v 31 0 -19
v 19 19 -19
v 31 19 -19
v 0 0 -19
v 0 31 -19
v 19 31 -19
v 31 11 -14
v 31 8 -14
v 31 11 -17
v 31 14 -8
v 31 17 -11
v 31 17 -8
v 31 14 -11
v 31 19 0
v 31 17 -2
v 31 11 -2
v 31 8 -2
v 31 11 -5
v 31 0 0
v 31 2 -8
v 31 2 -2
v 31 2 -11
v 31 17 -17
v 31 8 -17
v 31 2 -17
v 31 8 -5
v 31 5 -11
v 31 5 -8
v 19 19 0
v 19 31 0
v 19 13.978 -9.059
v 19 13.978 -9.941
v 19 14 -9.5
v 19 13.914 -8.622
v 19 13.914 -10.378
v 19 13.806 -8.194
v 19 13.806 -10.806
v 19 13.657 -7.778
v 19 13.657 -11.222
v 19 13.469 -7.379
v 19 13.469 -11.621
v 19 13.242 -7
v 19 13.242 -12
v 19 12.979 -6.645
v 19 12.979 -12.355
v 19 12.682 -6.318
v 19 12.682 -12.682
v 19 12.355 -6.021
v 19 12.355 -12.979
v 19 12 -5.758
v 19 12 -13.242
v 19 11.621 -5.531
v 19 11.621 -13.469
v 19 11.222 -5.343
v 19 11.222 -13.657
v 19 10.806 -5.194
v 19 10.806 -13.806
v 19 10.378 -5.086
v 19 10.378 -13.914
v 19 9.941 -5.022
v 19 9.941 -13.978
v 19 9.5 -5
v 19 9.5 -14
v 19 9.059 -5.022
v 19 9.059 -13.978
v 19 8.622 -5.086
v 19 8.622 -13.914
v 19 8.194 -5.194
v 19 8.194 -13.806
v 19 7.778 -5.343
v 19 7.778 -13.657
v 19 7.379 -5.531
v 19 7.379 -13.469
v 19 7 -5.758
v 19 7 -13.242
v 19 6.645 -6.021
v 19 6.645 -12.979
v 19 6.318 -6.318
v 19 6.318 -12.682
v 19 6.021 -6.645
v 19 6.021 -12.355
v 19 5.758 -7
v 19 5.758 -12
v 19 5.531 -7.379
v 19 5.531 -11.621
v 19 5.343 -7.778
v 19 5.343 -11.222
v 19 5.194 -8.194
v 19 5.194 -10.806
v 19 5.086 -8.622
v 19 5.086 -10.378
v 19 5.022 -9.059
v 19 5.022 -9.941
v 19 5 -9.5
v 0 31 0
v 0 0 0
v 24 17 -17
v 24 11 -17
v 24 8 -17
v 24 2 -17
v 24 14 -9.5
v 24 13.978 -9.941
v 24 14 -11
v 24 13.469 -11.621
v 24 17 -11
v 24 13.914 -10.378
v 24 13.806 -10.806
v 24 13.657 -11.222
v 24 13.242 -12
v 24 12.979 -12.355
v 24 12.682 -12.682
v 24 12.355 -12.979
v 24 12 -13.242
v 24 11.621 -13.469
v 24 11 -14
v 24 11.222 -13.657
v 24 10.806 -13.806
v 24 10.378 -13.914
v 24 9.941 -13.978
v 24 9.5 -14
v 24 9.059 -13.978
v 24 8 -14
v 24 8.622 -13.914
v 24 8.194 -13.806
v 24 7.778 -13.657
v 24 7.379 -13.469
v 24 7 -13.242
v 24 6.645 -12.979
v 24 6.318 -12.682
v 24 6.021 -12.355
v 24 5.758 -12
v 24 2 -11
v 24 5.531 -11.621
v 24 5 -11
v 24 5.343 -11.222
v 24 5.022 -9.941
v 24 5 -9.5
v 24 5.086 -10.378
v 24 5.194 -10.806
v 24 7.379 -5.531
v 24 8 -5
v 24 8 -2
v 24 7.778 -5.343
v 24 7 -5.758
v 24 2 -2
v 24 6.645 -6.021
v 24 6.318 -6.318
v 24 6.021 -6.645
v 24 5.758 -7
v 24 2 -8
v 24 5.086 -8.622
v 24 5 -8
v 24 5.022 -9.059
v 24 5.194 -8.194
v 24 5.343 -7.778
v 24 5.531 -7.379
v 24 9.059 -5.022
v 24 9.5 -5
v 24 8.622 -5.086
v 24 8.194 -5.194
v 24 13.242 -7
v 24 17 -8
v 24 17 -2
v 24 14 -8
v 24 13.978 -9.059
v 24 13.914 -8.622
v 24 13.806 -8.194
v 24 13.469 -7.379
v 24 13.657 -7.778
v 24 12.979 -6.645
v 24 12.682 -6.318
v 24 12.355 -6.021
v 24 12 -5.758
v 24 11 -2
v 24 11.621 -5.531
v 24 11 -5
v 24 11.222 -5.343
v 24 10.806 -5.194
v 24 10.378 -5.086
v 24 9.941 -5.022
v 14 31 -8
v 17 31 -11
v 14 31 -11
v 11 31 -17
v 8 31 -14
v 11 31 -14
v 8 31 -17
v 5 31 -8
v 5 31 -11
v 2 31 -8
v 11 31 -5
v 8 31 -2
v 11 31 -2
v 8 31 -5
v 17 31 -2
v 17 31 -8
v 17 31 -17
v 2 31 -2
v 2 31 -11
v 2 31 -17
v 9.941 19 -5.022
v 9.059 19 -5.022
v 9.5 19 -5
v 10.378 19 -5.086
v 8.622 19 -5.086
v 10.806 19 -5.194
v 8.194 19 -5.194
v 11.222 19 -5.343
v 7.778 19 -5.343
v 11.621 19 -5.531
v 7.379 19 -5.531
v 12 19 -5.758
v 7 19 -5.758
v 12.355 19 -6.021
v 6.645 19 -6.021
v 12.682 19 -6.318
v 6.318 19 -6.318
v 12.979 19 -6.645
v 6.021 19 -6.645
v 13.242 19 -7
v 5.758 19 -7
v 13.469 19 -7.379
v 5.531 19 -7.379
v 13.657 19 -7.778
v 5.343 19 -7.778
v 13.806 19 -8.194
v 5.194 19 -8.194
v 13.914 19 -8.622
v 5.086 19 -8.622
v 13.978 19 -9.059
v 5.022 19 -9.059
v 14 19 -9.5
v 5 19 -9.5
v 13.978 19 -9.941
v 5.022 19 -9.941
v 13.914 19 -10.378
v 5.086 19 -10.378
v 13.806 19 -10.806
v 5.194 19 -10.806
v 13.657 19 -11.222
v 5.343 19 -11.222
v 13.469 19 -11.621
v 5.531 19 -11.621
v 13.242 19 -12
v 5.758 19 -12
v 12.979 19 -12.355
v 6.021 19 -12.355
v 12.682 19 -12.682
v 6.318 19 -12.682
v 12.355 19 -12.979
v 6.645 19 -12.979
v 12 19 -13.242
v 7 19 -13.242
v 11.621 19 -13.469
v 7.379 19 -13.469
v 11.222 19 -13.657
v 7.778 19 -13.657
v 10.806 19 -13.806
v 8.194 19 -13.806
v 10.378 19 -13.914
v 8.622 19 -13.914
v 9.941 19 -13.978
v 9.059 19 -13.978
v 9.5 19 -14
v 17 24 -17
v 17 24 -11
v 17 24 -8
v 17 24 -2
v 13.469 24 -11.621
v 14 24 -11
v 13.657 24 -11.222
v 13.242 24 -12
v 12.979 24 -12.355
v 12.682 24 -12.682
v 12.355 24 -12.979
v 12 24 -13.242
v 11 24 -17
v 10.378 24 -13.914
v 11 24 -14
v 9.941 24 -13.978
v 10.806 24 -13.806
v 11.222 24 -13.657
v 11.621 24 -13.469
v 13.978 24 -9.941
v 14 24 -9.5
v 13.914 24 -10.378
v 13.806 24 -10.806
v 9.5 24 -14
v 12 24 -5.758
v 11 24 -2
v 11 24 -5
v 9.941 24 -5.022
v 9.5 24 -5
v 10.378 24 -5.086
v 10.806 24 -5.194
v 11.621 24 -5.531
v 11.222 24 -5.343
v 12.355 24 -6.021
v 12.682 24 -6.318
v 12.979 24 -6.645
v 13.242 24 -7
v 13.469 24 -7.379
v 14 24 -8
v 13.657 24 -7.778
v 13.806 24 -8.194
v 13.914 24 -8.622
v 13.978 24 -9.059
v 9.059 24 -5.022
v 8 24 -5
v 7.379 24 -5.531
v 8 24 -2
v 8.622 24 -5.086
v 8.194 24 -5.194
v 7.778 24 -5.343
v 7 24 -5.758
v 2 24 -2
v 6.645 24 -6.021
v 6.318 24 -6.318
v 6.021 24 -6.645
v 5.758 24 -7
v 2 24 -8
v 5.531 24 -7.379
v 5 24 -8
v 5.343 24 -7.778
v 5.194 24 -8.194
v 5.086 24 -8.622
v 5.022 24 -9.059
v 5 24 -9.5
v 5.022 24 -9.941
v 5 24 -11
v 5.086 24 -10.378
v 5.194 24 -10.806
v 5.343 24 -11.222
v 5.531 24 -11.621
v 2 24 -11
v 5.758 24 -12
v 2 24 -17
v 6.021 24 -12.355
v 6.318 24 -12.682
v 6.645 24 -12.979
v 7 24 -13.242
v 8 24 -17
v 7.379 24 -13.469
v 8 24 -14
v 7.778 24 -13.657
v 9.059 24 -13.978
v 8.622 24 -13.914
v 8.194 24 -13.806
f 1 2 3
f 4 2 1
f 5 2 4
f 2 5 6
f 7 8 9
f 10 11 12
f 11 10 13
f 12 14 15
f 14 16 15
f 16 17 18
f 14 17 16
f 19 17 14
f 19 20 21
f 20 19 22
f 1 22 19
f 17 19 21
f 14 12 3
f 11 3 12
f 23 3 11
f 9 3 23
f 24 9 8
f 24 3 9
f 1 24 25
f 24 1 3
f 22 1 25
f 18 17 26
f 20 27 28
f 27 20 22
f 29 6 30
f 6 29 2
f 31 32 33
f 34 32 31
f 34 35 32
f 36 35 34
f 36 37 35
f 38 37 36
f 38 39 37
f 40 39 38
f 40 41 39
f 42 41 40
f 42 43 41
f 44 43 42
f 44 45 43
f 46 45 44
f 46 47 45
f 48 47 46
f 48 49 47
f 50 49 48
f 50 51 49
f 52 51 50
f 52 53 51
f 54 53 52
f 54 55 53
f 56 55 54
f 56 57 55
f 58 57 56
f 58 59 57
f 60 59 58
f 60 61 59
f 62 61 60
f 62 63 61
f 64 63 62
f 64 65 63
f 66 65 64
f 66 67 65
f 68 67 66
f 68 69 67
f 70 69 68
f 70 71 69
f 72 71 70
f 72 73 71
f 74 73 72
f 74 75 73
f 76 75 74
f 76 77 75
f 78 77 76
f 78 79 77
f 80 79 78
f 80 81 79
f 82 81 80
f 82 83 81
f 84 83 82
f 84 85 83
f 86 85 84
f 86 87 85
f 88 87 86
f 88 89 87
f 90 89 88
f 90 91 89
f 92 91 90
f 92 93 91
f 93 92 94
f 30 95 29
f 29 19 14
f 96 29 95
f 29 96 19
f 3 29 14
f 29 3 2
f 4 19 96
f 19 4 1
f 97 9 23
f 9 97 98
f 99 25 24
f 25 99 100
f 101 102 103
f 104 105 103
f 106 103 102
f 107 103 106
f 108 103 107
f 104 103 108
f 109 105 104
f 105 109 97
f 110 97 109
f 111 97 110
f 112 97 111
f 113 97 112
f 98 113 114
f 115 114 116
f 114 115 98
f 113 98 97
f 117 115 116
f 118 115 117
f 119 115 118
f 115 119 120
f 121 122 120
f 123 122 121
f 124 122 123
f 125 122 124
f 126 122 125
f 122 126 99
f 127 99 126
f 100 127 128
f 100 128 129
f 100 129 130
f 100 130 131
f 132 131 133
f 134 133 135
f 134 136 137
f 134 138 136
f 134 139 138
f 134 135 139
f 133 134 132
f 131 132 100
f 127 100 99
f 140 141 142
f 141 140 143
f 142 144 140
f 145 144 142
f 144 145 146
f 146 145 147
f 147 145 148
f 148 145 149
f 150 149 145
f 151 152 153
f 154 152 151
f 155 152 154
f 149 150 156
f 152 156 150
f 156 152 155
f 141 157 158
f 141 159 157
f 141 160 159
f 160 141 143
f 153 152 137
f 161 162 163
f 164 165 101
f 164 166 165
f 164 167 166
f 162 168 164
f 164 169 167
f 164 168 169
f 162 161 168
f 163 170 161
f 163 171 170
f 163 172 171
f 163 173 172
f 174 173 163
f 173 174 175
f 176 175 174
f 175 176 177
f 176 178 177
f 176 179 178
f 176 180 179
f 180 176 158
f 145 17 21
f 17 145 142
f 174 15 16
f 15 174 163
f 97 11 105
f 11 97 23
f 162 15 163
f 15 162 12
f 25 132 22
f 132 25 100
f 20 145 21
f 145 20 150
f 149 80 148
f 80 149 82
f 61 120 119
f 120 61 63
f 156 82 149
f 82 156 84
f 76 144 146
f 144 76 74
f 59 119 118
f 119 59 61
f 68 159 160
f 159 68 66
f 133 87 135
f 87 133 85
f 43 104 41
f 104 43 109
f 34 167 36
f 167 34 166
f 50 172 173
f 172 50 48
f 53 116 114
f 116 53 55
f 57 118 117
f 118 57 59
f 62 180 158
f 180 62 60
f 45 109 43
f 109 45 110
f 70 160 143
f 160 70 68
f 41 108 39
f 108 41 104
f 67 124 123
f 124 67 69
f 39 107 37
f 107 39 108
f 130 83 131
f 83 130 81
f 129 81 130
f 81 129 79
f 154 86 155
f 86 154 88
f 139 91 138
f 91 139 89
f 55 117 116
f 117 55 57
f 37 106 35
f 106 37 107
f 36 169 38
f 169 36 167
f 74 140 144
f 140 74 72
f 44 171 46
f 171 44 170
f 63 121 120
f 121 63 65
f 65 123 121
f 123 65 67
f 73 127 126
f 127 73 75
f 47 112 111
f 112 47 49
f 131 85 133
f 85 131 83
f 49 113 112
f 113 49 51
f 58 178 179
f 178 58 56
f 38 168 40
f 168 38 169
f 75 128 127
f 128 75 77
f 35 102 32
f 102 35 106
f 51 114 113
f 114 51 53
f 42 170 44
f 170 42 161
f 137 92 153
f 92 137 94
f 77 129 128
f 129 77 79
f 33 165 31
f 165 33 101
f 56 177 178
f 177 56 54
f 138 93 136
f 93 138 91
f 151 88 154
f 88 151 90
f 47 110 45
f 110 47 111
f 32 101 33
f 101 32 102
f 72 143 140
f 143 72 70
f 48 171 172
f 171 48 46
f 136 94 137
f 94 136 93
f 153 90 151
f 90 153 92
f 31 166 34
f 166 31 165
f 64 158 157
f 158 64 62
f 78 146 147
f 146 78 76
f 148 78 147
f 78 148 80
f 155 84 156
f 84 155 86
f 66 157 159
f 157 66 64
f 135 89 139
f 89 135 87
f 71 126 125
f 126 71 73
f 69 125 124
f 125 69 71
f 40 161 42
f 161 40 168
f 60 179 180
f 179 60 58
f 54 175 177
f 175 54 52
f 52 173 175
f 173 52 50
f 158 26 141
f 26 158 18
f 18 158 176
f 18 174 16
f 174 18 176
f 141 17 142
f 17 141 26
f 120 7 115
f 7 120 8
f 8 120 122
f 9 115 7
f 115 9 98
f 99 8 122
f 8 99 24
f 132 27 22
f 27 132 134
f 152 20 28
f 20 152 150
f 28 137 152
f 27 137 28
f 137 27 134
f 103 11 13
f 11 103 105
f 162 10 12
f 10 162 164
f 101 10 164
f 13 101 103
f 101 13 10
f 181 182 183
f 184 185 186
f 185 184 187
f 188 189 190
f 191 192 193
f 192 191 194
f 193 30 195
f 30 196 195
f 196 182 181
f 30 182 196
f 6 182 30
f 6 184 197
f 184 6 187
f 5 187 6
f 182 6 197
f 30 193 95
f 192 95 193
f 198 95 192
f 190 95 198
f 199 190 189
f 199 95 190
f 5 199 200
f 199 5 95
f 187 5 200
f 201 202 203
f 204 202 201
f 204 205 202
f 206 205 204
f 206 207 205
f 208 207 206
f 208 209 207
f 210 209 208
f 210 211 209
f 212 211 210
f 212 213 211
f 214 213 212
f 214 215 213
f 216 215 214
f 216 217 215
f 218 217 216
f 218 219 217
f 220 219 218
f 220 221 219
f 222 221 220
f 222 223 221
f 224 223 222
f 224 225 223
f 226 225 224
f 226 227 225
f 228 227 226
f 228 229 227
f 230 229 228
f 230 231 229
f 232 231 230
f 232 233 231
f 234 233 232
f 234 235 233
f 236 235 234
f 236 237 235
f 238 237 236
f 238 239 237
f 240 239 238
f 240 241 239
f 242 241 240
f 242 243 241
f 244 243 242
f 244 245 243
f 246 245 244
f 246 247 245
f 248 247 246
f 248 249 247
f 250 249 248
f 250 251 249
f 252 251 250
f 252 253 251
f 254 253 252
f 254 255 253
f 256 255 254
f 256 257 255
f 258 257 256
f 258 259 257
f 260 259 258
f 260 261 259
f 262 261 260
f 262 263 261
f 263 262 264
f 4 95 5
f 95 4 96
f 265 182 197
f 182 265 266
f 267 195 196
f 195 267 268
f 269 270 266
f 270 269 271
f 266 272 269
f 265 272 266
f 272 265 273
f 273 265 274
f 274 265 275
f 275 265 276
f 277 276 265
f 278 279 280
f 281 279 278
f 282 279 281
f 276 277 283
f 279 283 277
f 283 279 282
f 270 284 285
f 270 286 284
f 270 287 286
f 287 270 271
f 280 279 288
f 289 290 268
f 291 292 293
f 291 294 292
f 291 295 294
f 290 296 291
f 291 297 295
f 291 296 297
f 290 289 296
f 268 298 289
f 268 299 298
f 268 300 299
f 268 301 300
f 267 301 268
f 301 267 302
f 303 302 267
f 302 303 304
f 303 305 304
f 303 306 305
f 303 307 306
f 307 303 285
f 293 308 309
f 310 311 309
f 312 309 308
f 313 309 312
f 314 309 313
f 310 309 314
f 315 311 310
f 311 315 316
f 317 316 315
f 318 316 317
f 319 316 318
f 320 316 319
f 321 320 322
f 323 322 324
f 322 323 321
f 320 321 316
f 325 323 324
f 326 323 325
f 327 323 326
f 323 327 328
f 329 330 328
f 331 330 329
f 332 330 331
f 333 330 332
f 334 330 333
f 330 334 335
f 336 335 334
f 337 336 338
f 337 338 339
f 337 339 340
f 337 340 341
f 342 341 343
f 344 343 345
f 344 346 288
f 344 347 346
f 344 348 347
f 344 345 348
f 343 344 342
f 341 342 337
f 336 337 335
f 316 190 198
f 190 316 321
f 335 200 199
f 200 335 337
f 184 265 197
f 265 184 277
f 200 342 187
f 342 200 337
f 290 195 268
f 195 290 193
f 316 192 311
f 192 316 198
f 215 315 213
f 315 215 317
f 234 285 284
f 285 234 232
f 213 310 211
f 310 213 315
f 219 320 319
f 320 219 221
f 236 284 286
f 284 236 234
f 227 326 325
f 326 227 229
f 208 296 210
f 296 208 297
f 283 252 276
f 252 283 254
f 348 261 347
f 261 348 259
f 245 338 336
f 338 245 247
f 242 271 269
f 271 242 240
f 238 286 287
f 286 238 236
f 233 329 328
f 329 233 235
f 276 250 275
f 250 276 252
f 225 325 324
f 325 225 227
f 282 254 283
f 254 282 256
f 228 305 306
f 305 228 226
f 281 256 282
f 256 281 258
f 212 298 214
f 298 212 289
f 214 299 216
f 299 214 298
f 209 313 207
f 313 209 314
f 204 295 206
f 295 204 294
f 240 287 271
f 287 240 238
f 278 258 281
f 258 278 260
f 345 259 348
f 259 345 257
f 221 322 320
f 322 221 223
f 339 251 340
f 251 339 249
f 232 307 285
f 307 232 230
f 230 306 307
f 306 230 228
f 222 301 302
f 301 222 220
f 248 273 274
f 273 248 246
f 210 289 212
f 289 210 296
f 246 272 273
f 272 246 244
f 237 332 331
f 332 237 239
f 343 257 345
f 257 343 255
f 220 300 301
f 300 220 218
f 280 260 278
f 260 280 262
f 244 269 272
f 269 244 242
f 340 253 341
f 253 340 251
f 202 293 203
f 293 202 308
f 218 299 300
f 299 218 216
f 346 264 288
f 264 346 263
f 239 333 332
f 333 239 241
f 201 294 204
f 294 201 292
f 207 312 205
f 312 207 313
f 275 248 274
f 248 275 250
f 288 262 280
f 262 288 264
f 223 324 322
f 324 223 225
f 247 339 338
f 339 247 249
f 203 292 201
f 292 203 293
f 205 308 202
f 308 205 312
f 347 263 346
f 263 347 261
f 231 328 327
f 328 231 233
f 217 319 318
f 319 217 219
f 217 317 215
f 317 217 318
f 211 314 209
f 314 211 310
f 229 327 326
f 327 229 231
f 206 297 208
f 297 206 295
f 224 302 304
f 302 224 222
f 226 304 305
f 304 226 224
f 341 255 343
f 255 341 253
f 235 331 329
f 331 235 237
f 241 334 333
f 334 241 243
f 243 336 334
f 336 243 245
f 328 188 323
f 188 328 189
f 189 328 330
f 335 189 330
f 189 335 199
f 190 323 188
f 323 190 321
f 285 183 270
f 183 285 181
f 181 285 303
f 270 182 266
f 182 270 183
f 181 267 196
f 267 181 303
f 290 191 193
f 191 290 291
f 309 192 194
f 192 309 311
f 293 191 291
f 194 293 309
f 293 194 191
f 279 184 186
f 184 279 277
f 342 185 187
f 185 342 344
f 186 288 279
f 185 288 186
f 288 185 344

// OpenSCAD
$fn = 64;


size = 30;

h = 20;

r = 5;

holeD = 6.8;
holeR = holeD / 2.0 ;


/*
module smoothSquare(size,r,h){
    
    difference(){
        translate([0,0,0]) cube([size,size,h]);
    
        translate([0,0,0]) cube([r,r,h]);
        translate([size - r,0,0]) cube([r,r,h]);
        translate([0,size - r,0]) cube([r,r,h]);
        translate([size - r,size - r,0]) cube([r,r,h]);
        
    }
    
    translate([r,r,0]) cylinder(h,r,r);
    translate([size - r,r,0]) cylinder(h,r,r);
    translate([r, size - r,0]) cylinder(h,r,r);
    translate([size - r ,size - r ,0]) cylinder(h,r,r);
   
      
}




module cutOut(x,y){
    
 difference(){
    translate([x  , y + 2,0]) cube([5,6,h]);

          
   translate([x + 2 ,y + 8 ,0]) rotate([0,0,-35]){
         cube([6,4,h]);  
        }
        
    translate([x + 4,y - 2 ,0]) rotate([0,0,35]){
            cube([6,4,h]);  
          }      
        
        
    }

    
}

module crossSection(){
    
    difference(){

    smoothSquare(size,r,h);
    

    
    cutOut(0,10);
    
    rotate([0,0,-90]){
        cutOut(-30,10);
    }
    
    rotate([0,0,180]){
        cutOut(-30,-20);
    }
   
    
    rotate([0,0,90]){
        cutOut(0,-20);
    }
}
    
}
*/
/* START OF DESIGN */
/*
difference(){
    
    translate([-4,-4,-4]) cube( [size + 8  , size + 8 , h + 4 ] );

    crossSection();
    
    translate( [ size / 2 ,size / 2 , - 4 ] ) #cylinder( 4 , 3 , 3 ); 
    
    translate( [ size / 2 ,size / 2 , - 1 ] ) cylinder( 4 , 5.75 , 5.75 ); 
    
}*/

width = 15.0;
wall = ( 19 -  width ) * 0.5;


module brick( x  , y , z ){
    
    
translate( [ x , y , z ] ){
    
    difference(){

        translate([0,0,0]) cube ([19,19,12]);
    
        translate([wall,wall,5]) cube ([width,width,9]);
    
        //translate( [ 9.5 , 9.5 ,0  ] ) #cylinder( 3 , 1.6 , 1.7 ); 
        //translate( [ 9.5 , 9.5 ,3  ] ) #cylinder( 2 , 3.0 , 3.0 ); 
        
         translate( [ 9.5 , 9.5 ,0  ] ) cylinder( 5 , 4.5 , 4.5 ); 
    
    
    }


    translate([0,8,0]) cube ([5,3,12]);
    translate([14,8,0]) cube ([5,3,12]);
    translate([8,0,0]) cube ([3,5,12]);
    translate([8,14,0]) cube ([3,5,12]);

    
    
    }
    
}



vertex = 0;


if ( vertex == 1 ) brick(0,0,0);

rotate( [ 0 , 90 , 0 ] ){
    brick(0,0,19);
}


rotate( [ 270 , 0 , 0 ] ){
    brick(0,0,19);
}



difference(){
 
    translate([0,0,-19]) cube ([19,19,19]);
    
    if ( vertex == 1 ){

        translate( [ 9.5 , 9.5 , -19  ] ) cylinder( 3 , 1.6 , 1.6 ); 
        translate( [ 9.5 , 9.5 ,-16 ] ) cylinder( 20 , 3.0 , 4.5 ); 
    
    }
   /*
    rotate( [ 0 , 90 , 0 ] ){
        translate( [ 9.5 , 9.5 , 0 ] ) cylinder( 3 , 1.6 , 1.6 ); 
        translate( [ 9.5 , 9.5 ,3 ] ) cylinder( 20 , 3.0 , 4.5 ); 
    }
    
    
     rotate( [ 270 , 0 , 0 ] ){
        translate( [ 9.5 , 9.5 , 0 ] ) cylinder( 3 , 1.6 , 1.6 ); 
        translate( [ 9.5 , 9.5 ,3 ] ) cylinder( 20 , 3.0 , 4.5 ); 
    }
    */
    
}

 
